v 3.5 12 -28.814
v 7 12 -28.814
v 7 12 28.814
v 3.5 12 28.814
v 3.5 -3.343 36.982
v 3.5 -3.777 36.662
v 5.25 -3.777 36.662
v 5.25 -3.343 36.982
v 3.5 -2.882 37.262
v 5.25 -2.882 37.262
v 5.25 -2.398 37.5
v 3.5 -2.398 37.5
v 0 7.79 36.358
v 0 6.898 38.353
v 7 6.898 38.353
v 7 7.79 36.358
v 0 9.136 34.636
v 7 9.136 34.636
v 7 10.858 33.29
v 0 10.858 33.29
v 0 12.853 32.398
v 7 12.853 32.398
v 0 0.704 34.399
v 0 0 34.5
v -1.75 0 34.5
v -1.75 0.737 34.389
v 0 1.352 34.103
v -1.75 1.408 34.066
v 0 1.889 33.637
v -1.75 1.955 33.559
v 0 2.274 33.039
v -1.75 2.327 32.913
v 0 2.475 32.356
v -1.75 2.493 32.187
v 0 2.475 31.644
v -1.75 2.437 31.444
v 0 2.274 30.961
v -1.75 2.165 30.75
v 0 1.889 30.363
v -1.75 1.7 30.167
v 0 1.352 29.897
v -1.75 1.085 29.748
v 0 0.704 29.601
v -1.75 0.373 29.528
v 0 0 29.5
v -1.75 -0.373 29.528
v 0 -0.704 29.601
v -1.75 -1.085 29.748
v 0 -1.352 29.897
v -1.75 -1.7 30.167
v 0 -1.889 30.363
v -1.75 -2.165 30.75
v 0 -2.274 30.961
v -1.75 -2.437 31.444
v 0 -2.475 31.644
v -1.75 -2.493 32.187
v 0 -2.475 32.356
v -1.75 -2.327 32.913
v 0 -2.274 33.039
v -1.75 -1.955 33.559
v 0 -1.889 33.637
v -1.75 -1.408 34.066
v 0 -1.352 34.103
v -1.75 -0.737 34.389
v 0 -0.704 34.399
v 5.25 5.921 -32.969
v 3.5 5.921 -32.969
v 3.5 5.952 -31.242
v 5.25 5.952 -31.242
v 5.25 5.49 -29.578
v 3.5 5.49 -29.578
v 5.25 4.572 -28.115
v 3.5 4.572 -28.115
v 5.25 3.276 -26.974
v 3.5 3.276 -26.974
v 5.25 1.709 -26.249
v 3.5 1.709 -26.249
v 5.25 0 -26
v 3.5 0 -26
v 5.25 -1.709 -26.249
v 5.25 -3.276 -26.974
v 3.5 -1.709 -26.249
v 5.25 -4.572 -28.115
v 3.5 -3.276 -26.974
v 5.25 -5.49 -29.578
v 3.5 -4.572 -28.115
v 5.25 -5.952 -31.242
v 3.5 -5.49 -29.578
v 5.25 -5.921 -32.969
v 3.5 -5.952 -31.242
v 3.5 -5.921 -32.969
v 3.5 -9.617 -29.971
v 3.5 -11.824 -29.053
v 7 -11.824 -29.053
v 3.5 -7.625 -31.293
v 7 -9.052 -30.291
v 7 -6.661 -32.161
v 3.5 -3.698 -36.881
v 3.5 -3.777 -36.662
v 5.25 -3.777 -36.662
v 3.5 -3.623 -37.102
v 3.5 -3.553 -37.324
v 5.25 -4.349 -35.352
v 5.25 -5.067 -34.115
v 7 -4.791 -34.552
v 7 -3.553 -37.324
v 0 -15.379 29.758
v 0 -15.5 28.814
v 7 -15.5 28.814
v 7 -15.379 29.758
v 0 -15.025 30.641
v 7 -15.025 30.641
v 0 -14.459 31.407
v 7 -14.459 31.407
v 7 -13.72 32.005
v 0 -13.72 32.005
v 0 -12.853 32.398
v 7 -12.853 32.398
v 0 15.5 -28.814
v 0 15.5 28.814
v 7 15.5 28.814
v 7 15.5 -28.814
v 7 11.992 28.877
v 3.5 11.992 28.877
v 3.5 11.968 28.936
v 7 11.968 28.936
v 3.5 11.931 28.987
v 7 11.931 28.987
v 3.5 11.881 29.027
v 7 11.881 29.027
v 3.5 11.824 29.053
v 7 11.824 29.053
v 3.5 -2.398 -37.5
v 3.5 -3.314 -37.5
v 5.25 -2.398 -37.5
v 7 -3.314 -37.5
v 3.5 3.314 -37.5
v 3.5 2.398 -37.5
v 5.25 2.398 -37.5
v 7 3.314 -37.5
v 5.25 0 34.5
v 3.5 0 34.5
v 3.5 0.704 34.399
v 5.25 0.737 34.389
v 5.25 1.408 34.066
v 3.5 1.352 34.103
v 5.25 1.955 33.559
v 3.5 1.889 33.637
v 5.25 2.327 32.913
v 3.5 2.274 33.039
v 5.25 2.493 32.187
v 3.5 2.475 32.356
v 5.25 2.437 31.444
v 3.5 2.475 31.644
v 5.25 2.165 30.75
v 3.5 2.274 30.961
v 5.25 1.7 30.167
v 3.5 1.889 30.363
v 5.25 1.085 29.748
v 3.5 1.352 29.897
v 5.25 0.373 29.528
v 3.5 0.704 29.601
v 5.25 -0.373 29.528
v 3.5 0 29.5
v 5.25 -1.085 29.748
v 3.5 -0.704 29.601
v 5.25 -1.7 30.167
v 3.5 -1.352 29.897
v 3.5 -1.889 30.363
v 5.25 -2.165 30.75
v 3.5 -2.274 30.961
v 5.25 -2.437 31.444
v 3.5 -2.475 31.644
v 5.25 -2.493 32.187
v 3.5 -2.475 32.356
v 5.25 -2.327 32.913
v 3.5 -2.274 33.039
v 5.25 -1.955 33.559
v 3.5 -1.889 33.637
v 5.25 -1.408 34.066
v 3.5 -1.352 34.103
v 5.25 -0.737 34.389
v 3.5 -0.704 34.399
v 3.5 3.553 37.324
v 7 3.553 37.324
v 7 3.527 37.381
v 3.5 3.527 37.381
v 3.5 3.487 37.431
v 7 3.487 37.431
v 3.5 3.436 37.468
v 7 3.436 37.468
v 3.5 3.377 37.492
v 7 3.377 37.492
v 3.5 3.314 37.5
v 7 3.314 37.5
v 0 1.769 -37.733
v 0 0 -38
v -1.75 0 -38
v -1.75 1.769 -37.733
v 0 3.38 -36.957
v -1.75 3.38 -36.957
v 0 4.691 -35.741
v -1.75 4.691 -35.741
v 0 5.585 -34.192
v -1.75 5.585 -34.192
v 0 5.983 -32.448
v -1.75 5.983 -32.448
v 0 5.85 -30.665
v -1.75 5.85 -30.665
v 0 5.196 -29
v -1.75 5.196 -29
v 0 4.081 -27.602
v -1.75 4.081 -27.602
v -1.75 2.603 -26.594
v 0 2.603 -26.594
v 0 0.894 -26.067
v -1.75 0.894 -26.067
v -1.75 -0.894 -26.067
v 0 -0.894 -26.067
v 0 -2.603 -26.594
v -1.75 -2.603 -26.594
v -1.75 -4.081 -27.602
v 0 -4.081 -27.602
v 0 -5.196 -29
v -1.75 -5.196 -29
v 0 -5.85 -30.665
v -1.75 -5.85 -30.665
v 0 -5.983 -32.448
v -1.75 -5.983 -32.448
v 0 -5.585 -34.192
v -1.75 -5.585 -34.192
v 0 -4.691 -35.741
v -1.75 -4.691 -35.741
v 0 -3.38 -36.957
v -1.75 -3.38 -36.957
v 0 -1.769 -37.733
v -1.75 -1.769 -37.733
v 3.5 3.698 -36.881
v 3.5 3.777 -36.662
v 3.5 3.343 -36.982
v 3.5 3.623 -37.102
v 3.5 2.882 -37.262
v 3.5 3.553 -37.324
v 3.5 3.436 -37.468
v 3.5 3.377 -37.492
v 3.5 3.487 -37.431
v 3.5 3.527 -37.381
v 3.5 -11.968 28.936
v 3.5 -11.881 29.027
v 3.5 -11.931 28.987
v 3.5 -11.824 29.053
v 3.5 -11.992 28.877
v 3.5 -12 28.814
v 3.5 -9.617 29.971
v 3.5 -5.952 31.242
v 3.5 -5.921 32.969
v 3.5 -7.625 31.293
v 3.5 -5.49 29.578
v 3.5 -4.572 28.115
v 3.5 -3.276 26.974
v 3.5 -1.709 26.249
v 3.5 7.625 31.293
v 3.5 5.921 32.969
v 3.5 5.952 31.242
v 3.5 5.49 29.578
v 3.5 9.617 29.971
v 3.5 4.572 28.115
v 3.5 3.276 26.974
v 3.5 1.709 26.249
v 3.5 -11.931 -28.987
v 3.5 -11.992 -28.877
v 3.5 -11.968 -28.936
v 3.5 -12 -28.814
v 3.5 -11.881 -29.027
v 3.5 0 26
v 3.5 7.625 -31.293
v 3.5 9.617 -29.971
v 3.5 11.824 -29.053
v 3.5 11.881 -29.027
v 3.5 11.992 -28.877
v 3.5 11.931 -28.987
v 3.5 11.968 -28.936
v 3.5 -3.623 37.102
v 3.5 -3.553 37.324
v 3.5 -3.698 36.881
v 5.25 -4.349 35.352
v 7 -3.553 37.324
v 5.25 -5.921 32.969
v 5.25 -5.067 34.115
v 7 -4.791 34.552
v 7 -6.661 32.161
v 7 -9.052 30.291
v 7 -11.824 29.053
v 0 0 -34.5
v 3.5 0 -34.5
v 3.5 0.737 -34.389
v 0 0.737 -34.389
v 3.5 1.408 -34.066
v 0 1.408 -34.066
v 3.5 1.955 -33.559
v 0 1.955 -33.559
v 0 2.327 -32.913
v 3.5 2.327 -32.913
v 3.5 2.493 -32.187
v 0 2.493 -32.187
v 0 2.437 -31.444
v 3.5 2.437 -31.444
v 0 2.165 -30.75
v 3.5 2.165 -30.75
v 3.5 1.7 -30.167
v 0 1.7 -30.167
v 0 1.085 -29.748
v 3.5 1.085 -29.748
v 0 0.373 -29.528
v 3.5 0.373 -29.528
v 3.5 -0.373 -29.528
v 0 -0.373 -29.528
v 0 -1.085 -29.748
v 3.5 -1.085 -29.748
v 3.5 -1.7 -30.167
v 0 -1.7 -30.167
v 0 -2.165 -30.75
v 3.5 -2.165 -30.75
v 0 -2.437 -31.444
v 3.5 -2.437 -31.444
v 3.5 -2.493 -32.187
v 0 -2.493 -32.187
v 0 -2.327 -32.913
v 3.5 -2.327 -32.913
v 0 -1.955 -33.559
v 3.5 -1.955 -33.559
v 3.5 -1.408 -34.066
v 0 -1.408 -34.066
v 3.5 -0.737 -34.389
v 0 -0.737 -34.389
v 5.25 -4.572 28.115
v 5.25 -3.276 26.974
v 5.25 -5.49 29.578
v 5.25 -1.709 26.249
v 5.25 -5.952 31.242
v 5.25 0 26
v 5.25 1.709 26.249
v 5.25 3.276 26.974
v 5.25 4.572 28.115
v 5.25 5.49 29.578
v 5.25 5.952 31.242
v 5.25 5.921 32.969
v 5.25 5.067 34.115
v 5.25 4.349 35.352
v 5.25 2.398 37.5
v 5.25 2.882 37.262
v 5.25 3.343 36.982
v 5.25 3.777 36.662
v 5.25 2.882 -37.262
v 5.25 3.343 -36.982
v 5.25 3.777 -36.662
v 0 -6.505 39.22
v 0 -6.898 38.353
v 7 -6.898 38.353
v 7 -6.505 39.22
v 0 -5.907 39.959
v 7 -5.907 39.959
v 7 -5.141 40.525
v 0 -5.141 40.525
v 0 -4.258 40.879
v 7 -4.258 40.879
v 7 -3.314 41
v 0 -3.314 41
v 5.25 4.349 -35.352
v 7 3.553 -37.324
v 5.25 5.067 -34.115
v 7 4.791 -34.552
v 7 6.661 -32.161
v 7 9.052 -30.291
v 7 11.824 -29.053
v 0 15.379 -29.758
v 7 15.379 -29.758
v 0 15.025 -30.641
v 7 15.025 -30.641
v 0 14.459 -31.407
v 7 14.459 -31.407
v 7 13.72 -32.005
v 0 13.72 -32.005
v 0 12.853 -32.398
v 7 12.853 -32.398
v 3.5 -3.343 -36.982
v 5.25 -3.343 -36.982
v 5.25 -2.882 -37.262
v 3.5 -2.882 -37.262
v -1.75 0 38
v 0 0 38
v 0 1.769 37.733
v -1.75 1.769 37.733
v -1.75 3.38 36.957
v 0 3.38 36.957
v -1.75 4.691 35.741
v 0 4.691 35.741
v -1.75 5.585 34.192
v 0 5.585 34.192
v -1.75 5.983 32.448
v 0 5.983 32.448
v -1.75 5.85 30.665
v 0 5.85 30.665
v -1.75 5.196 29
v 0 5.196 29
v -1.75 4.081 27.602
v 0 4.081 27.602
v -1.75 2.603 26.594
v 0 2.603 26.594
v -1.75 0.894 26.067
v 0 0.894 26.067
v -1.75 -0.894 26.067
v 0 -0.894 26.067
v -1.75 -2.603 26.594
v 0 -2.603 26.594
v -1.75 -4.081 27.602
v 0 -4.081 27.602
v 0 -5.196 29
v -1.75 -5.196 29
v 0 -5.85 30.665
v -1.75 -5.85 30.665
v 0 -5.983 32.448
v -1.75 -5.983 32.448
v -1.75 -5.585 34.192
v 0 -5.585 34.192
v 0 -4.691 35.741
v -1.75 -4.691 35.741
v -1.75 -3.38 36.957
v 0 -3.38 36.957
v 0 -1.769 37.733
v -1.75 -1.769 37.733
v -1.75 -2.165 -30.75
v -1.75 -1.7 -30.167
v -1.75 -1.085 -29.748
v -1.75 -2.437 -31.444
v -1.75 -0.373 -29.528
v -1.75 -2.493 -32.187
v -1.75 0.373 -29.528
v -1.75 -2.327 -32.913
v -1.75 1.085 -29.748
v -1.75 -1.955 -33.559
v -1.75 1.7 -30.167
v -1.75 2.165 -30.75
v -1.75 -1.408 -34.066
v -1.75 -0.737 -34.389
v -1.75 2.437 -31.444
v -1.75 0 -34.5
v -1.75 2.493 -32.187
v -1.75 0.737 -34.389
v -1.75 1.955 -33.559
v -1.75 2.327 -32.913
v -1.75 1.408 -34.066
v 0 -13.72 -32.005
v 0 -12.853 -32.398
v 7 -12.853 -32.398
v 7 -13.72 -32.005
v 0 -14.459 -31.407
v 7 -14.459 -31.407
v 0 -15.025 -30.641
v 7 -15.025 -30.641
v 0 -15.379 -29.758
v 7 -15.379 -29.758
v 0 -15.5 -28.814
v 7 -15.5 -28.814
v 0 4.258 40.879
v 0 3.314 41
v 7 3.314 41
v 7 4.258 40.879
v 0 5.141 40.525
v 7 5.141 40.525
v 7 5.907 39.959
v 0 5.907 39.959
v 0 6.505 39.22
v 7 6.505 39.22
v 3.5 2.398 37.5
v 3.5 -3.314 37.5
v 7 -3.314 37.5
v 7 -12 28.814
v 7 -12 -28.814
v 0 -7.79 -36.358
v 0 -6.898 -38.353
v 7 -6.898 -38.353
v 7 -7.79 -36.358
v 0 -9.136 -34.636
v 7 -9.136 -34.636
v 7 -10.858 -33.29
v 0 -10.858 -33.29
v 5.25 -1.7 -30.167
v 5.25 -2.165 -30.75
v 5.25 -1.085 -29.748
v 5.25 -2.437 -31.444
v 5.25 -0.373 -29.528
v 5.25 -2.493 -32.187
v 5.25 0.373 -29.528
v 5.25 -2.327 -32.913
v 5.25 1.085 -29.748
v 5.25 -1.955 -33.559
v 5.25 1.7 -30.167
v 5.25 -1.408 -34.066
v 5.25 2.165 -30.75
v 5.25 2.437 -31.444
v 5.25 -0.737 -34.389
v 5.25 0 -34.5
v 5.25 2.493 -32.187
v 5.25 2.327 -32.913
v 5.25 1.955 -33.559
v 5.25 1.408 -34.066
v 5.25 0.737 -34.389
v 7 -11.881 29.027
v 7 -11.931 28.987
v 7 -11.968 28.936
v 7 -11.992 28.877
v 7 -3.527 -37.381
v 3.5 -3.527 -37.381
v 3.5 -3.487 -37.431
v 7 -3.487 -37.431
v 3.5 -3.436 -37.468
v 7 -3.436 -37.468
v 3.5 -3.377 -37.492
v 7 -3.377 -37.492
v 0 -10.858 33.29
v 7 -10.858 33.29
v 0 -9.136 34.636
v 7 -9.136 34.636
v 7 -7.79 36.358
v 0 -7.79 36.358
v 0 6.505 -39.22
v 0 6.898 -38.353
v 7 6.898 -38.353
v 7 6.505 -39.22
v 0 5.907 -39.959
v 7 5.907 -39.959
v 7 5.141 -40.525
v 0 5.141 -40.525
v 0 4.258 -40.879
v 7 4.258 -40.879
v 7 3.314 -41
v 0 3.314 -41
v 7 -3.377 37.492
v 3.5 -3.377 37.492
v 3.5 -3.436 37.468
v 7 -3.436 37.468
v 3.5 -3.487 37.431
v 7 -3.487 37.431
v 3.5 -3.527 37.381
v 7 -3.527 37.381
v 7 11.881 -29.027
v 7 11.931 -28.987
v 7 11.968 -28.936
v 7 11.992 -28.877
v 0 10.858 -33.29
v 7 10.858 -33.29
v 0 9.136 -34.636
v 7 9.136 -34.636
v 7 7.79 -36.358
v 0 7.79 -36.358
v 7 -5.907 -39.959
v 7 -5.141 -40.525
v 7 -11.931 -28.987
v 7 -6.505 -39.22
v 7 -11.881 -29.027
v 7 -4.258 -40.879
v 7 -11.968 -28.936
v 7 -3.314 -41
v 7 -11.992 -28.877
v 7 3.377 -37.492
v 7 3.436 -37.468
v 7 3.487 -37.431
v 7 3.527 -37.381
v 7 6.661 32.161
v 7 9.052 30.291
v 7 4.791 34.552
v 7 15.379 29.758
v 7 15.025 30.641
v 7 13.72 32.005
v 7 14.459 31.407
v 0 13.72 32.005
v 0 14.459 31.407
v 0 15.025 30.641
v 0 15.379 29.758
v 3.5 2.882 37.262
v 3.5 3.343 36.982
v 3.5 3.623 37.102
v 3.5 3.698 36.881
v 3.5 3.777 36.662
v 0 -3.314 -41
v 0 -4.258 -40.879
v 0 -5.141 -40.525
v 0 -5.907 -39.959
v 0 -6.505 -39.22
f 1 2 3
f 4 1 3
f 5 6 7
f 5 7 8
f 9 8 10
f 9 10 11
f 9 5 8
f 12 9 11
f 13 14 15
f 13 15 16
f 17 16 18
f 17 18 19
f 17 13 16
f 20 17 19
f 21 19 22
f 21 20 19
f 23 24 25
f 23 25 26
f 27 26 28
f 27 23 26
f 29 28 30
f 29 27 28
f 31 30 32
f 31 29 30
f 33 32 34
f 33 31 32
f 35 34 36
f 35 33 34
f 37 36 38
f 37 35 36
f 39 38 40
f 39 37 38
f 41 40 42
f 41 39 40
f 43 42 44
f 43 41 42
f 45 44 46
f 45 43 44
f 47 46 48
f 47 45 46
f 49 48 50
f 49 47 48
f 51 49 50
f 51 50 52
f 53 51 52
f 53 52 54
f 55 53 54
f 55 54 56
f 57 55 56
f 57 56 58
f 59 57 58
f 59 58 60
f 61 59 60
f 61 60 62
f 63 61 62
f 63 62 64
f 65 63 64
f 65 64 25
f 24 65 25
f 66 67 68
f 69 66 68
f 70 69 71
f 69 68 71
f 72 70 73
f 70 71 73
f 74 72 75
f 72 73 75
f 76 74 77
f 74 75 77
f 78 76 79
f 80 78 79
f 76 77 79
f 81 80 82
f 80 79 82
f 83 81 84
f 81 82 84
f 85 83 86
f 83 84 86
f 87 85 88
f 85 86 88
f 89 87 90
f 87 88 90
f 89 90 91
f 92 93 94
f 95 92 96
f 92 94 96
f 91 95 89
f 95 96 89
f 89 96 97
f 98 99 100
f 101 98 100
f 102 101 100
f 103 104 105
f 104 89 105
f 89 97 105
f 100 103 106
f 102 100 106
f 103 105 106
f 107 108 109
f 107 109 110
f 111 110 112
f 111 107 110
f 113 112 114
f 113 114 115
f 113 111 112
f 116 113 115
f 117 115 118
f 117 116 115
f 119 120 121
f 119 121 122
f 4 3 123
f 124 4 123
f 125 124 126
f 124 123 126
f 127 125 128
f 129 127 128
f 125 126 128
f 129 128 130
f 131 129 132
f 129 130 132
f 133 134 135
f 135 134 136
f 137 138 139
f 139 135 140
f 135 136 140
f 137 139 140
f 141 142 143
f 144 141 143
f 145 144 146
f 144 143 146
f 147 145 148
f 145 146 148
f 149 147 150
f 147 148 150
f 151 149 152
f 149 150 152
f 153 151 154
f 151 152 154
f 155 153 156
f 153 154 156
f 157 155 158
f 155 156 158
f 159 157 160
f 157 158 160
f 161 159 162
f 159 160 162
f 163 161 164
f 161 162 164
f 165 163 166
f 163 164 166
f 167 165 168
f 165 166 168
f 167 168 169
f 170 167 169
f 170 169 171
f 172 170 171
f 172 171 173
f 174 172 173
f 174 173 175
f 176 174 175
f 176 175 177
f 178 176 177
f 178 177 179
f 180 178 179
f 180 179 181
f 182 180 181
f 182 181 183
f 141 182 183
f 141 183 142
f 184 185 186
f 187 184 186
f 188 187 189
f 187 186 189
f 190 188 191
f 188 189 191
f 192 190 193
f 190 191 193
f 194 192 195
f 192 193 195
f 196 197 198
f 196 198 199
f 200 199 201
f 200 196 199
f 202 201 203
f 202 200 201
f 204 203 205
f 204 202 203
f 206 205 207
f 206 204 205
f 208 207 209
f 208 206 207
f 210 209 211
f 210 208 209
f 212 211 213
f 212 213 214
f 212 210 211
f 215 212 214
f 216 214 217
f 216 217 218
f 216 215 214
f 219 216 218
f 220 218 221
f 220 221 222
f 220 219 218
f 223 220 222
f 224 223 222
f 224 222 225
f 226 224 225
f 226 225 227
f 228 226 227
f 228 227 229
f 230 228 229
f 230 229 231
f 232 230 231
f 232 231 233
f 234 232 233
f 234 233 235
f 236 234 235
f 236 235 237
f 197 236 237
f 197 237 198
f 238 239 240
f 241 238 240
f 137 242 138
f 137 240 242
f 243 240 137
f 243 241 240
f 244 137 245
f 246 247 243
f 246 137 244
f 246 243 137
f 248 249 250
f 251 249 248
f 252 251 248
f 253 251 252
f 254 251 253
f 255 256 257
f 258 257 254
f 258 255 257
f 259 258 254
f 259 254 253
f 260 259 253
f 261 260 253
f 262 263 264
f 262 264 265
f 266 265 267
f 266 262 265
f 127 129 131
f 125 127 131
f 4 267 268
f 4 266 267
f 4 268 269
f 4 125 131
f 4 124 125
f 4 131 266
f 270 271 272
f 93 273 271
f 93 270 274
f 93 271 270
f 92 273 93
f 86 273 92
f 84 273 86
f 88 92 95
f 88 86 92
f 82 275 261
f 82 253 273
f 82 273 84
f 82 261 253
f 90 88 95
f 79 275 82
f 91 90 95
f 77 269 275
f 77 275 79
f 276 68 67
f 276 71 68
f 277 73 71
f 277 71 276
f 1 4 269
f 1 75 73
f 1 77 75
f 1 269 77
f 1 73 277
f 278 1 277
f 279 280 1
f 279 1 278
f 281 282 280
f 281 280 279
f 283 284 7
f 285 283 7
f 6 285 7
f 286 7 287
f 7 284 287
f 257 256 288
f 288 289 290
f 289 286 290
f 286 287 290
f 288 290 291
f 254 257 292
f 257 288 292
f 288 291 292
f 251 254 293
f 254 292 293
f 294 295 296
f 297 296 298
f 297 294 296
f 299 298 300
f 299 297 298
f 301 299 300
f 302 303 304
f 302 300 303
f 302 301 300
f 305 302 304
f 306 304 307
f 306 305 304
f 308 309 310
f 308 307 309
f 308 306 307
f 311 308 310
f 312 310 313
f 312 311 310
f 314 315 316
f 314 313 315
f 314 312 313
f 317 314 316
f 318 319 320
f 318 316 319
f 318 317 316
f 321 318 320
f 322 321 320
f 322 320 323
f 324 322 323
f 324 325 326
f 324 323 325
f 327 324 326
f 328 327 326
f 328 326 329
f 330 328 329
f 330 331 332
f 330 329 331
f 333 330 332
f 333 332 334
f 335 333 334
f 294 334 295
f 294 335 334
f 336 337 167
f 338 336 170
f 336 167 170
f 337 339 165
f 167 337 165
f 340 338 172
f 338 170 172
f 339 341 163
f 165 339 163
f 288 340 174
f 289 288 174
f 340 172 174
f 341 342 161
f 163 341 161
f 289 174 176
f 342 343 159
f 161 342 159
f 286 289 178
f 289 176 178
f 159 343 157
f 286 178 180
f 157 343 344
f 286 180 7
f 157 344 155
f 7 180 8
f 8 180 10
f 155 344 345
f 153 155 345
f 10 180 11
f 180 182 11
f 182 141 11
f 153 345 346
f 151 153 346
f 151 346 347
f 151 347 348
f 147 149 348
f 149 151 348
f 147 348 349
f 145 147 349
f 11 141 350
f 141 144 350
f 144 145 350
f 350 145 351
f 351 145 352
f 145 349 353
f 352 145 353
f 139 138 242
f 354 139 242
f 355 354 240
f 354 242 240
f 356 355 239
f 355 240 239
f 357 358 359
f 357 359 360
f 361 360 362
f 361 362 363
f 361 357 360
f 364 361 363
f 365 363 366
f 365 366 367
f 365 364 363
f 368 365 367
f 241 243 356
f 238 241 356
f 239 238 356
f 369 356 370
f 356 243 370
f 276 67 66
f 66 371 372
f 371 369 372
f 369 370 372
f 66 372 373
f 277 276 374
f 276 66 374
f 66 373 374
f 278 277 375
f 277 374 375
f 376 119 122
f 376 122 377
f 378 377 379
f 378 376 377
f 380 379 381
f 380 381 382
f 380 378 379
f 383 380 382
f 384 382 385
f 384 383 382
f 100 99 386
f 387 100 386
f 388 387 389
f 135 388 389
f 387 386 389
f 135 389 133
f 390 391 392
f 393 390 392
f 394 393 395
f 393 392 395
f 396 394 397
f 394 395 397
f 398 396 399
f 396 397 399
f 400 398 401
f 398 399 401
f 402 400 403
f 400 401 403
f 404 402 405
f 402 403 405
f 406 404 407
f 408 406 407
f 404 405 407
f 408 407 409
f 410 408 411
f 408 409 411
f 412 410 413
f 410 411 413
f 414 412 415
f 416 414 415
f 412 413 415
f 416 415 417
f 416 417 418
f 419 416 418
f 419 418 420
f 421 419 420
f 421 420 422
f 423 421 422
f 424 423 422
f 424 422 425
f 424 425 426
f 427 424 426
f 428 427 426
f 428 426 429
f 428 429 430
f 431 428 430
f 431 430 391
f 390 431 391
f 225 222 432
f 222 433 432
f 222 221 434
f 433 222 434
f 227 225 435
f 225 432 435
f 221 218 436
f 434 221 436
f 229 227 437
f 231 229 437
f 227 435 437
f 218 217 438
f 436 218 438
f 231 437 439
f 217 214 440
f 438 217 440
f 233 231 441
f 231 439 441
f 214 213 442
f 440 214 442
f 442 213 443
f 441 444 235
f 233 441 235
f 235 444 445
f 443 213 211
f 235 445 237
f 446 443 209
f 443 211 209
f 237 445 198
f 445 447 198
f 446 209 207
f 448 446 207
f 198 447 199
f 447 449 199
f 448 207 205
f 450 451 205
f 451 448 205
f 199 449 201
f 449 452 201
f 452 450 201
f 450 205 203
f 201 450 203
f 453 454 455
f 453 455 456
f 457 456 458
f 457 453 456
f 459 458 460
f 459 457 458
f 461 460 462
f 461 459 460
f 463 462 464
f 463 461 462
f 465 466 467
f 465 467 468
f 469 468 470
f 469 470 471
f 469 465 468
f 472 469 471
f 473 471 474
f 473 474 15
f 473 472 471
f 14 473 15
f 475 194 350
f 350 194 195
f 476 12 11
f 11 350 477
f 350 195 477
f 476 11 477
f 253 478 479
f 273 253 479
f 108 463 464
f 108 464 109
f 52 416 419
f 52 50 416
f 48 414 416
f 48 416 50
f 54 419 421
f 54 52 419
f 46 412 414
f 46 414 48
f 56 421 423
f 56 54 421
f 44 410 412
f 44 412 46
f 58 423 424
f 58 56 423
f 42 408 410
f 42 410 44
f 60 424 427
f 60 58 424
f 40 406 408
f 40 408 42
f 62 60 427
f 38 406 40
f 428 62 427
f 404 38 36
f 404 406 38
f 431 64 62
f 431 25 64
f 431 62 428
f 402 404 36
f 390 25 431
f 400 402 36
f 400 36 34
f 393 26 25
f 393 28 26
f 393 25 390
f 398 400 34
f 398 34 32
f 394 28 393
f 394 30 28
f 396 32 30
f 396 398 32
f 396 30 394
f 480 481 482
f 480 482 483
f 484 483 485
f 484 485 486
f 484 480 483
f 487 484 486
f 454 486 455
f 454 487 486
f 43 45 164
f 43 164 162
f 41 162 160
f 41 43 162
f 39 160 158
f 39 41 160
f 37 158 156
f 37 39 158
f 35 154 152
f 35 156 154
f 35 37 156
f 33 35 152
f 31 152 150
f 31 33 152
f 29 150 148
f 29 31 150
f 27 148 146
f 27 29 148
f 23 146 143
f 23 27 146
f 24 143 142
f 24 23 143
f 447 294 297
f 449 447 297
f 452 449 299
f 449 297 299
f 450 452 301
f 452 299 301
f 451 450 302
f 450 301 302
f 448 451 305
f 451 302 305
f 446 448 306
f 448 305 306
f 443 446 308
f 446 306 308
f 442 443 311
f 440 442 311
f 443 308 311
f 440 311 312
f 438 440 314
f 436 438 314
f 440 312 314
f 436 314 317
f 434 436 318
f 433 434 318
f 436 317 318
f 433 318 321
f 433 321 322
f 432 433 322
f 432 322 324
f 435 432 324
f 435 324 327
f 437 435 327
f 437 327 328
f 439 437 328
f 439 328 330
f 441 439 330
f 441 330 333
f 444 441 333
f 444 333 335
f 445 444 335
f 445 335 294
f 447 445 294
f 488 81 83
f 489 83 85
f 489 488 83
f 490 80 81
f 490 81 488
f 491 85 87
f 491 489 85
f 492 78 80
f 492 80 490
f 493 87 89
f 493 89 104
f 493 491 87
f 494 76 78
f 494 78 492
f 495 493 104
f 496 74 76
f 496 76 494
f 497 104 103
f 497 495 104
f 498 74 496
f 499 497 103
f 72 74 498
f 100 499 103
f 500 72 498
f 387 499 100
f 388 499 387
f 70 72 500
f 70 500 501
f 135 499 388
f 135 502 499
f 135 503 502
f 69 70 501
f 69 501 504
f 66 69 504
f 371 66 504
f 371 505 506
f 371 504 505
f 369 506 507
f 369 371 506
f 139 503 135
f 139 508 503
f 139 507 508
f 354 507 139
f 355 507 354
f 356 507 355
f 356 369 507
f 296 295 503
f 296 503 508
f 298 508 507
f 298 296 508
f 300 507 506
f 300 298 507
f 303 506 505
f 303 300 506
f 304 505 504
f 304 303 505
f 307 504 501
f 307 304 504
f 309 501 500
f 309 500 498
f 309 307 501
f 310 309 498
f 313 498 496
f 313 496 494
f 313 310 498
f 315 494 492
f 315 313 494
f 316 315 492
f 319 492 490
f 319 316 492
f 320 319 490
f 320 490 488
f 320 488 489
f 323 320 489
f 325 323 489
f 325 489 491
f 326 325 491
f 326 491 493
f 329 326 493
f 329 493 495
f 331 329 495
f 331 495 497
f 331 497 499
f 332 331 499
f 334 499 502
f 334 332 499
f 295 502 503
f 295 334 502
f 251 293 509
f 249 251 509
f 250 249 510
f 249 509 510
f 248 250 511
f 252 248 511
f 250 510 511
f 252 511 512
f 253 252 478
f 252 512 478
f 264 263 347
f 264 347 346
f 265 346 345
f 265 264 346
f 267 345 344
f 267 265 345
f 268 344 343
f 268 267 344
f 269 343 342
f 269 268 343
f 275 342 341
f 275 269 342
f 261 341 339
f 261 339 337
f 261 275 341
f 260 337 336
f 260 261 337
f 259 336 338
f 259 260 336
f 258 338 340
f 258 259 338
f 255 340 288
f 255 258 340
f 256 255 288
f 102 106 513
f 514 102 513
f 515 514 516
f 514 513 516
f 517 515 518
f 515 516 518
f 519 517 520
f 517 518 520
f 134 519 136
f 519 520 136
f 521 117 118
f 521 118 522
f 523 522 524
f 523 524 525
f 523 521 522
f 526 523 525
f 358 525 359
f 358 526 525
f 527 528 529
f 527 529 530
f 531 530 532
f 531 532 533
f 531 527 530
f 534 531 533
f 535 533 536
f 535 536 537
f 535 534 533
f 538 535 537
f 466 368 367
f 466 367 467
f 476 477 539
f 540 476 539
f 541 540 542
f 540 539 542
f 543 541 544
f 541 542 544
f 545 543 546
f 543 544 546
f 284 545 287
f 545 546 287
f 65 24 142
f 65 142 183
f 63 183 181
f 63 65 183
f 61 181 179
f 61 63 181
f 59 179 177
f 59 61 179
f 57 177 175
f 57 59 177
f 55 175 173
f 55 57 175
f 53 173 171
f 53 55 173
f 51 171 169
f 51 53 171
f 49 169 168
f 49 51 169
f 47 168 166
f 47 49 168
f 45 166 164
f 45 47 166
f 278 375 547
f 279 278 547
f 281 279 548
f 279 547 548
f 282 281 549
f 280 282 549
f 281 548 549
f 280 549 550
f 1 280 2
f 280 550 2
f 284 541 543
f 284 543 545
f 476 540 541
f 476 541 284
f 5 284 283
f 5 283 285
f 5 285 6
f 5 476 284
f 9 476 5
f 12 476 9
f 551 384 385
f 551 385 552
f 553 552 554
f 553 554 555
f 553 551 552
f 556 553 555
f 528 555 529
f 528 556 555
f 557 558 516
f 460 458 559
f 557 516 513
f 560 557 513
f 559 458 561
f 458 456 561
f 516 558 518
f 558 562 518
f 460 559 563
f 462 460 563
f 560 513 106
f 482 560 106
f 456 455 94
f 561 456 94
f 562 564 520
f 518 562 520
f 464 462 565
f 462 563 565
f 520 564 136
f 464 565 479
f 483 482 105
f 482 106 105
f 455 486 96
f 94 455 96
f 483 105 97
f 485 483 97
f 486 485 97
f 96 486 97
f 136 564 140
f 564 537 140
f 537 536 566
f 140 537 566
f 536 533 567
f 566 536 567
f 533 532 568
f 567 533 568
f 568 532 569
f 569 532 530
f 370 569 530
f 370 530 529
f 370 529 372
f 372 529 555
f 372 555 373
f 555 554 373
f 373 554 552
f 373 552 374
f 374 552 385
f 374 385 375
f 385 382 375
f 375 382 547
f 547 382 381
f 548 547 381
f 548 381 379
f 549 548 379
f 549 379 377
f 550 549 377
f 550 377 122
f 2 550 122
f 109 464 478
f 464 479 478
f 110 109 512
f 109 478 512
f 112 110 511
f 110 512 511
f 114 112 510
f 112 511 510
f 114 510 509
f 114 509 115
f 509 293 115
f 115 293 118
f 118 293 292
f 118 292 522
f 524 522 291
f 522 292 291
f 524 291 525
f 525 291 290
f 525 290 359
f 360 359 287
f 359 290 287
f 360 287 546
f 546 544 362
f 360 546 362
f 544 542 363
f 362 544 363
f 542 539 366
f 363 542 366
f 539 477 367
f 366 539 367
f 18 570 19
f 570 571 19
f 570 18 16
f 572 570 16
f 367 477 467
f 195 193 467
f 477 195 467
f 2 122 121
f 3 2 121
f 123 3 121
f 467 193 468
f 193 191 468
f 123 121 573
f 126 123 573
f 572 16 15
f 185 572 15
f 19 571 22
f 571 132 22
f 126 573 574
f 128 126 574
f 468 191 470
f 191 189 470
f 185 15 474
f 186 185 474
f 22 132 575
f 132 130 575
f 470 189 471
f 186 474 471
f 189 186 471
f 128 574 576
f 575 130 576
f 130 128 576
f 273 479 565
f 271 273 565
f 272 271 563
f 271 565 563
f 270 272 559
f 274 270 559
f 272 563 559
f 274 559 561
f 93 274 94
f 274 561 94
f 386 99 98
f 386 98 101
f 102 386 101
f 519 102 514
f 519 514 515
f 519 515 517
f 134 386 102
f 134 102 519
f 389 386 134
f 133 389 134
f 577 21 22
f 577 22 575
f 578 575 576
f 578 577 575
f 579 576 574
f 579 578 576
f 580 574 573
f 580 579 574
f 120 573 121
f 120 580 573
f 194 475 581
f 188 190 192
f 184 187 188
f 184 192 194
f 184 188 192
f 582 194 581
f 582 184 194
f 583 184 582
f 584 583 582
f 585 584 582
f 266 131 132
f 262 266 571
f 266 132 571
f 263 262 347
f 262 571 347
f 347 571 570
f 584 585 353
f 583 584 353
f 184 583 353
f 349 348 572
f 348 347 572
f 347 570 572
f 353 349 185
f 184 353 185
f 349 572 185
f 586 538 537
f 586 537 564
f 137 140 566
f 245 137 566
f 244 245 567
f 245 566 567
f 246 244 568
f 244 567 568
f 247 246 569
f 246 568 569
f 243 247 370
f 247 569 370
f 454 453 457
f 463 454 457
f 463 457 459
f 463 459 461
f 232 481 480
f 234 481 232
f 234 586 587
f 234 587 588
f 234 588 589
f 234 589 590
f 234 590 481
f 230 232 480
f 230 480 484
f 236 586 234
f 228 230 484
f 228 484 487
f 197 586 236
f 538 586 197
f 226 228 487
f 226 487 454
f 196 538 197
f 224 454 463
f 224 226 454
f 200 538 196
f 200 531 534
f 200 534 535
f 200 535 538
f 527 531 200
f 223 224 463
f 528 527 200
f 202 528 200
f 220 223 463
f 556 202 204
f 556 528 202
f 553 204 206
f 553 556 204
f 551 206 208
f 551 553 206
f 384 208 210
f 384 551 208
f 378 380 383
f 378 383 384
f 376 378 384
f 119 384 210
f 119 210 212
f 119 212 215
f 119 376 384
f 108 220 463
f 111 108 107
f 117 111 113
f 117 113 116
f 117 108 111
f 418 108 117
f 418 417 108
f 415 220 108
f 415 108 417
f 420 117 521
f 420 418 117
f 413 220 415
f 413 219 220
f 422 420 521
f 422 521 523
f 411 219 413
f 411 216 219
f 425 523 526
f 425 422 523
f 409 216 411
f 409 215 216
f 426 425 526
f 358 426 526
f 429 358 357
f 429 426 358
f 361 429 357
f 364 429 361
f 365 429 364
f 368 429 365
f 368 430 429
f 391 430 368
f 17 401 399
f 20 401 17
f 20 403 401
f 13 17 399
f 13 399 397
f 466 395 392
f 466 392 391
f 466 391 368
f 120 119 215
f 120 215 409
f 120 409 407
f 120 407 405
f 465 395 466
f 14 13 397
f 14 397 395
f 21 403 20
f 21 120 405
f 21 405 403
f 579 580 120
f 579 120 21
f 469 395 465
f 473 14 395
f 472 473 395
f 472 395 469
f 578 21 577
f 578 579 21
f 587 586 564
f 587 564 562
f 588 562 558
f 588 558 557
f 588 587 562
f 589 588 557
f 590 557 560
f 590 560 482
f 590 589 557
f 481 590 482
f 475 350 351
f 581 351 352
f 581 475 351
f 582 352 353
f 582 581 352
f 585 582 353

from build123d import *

# Parameters (mm, degrees)
SKETCH1_R           = 2.5
BOSS_EXTRUDE1_DEPTH = 7
CUT_EXTRUDE1_DEPTH  = 3.5
SKETCH7_R           = 6
SKETCH7_R_2         = 2.5
BOSS_EXTRUDE2_DEPTH = 5.25
SKETCH8_R           = 6
SKETCH8_R_2         = 2.5
BOSS_EXTRUDE3_DEPTH = 1.75


with BuildPart() as part:
    # Sketch1 → Boss-Extrude1 (new body)
    with BuildSketch(Plane(origin=(0, 0, 0), x_dir=(0, 0, -1), z_dir=(1, 0, 0))):
        with BuildLine():
            Line((28.813942393, -15.5), (-28.813942393, -15.5))
            ThreePointArc((-28.813942393, -15.5), (-31.041774365, -14.76649875), (-32.398076983, -12.852941176))
            ThreePointArc((-32.398076983, -12.852941176), (-34.636038969, -9.136038969), (-38.352941176, -6.898076983))
            ThreePointArc((-38.352941176, -6.898076983), (-40.26649875, -5.541774365), (-41, -3.313942393))
            Line((-41, -3.313942393), (-41, 3.313942393))
            ThreePointArc((-41, 3.313942393), (-40.26649875, 5.541774365), (-38.352941176, 6.898076983))
            ThreePointArc((-38.352941176, 6.898076983), (-34.636038969, 9.136038969), (-32.398076983, 12.852941176))
            ThreePointArc((-32.398076983, 12.852941176), (-31.041774365, 14.76649875), (-28.813942393, 15.5))
            Line((-28.813942393, 15.5), (28.813942393, 15.5))
            ThreePointArc((28.813942393, 15.5), (31.041774365, 14.76649875), (32.398076983, 12.852941176))
            ThreePointArc((32.398076983, 12.852941176), (34.636038969, 9.136038969), (38.352941176, 6.898076983))
            ThreePointArc((38.352941176, 6.898076983), (40.26649875, 5.541774365), (41, 3.313942393))
            Line((41, 3.313942393), (41, -3.313942393))
            ThreePointArc((41, -3.313942393), (40.26649875, -5.541774365), (38.352941176, -6.898076983))
            ThreePointArc((38.352941176, -6.898076983), (34.636038969, -9.136038969), (32.398076983, -12.852941176))
            ThreePointArc((32.398076983, -12.852941176), (31.041774365, -14.76649875), (28.813942393, -15.5))
        make_face()
        with Locations((-32, 0)):
            Circle(SKETCH1_R, mode=Mode.SUBTRACT)
        with Locations((32, 0)):
            Circle(SKETCH1_R, mode=Mode.SUBTRACT)
    extrude(amount=BOSS_EXTRUDE1_DEPTH)

    # Sketch6 → Cut-Extrude1 (cut)
    with BuildSketch(Plane(origin=(7, 0, 0), x_dir=(0, 0, -1), z_dir=(1, 0, 0))):
        with BuildLine():
            Line((28.813942393, 12), (-28.813942393, 12))
            ThreePointArc((-28.813942393, 12), (-28.962464524, 11.951099917), (-29.052884699, 11.823529412))
            ThreePointArc((-29.052884699, 11.823529412), (-32.161165235, 6.661165235), (-37.323529412, 3.552884699))
            ThreePointArc((-37.323529412, 3.552884699), (-37.451099917, 3.462464524), (-37.5, 3.313942393))
            Line((-37.5, 3.313942393), (-37.5, -3.313942393))
            ThreePointArc((-37.5, -3.313942393), (-37.451099917, -3.462464524), (-37.323529412, -3.552884699))
            ThreePointArc((-37.323529412, -3.552884699), (-32.161165235, -6.661165235), (-29.052884699, -11.823529412))
            ThreePointArc((-29.052884699, -11.823529412), (-28.962464524, -11.951099917), (-28.813942393, -12))
            Line((-28.813942393, -12), (28.813942393, -12))
            ThreePointArc((28.813942393, -12), (28.962464524, -11.951099917), (29.052884699, -11.823529412))
            ThreePointArc((29.052884699, -11.823529412), (32.161165235, -6.661165235), (37.323529412, -3.552884699))
            ThreePointArc((37.323529412, -3.552884699), (37.451099917, -3.462464524), (37.5, -3.313942393))
            Line((37.5, -3.313942393), (37.5, 3.313942393))
            ThreePointArc((37.5, 3.313942393), (37.451099917, 3.462464524), (37.323529412, 3.552884699))
            ThreePointArc((37.323529412, 3.552884699), (32.161165235, 6.661165235), (29.052884699, 11.823529412))
            ThreePointArc((29.052884699, 11.823529412), (28.962464524, 11.951099917), (28.813942393, 12))
        make_face()
    extrude(amount=-CUT_EXTRUDE1_DEPTH, mode=Mode.SUBTRACT)

    # Sketch7 → Boss-Extrude2 (add)
    with BuildSketch(Plane(origin=(3.5, 0, 0), x_dir=(0, 0, -1), z_dir=(1, 0, 0))):
        with Locations((32, 0)):
            Circle(SKETCH7_R)
        with Locations((32, 0)):
            Circle(SKETCH7_R_2, mode=Mode.SUBTRACT)
    boss_extrude2 = extrude(amount=-BOSS_EXTRUDE2_DEPTH)

    # Mirror1: Boss-Extrude2 across plane
    add(boss_extrude2.mirror(Plane.XY))

    # Sketch8 → Boss-Extrude3 (add)
    with BuildSketch(Plane(origin=(3.5, 0, 0), x_dir=(0, 0, -1), z_dir=(1, 0, 0))):
        with Locations((32, 0)):
            Circle(SKETCH8_R)
        with Locations((32, 0)):
            Circle(SKETCH8_R_2, mode=Mode.SUBTRACT)
    boss_extrude3 = extrude(amount=BOSS_EXTRUDE3_DEPTH)

    # Mirror2: Boss-Extrude3 across plane
    add(boss_extrude3.mirror(Plane.XY))


solid = part.part
